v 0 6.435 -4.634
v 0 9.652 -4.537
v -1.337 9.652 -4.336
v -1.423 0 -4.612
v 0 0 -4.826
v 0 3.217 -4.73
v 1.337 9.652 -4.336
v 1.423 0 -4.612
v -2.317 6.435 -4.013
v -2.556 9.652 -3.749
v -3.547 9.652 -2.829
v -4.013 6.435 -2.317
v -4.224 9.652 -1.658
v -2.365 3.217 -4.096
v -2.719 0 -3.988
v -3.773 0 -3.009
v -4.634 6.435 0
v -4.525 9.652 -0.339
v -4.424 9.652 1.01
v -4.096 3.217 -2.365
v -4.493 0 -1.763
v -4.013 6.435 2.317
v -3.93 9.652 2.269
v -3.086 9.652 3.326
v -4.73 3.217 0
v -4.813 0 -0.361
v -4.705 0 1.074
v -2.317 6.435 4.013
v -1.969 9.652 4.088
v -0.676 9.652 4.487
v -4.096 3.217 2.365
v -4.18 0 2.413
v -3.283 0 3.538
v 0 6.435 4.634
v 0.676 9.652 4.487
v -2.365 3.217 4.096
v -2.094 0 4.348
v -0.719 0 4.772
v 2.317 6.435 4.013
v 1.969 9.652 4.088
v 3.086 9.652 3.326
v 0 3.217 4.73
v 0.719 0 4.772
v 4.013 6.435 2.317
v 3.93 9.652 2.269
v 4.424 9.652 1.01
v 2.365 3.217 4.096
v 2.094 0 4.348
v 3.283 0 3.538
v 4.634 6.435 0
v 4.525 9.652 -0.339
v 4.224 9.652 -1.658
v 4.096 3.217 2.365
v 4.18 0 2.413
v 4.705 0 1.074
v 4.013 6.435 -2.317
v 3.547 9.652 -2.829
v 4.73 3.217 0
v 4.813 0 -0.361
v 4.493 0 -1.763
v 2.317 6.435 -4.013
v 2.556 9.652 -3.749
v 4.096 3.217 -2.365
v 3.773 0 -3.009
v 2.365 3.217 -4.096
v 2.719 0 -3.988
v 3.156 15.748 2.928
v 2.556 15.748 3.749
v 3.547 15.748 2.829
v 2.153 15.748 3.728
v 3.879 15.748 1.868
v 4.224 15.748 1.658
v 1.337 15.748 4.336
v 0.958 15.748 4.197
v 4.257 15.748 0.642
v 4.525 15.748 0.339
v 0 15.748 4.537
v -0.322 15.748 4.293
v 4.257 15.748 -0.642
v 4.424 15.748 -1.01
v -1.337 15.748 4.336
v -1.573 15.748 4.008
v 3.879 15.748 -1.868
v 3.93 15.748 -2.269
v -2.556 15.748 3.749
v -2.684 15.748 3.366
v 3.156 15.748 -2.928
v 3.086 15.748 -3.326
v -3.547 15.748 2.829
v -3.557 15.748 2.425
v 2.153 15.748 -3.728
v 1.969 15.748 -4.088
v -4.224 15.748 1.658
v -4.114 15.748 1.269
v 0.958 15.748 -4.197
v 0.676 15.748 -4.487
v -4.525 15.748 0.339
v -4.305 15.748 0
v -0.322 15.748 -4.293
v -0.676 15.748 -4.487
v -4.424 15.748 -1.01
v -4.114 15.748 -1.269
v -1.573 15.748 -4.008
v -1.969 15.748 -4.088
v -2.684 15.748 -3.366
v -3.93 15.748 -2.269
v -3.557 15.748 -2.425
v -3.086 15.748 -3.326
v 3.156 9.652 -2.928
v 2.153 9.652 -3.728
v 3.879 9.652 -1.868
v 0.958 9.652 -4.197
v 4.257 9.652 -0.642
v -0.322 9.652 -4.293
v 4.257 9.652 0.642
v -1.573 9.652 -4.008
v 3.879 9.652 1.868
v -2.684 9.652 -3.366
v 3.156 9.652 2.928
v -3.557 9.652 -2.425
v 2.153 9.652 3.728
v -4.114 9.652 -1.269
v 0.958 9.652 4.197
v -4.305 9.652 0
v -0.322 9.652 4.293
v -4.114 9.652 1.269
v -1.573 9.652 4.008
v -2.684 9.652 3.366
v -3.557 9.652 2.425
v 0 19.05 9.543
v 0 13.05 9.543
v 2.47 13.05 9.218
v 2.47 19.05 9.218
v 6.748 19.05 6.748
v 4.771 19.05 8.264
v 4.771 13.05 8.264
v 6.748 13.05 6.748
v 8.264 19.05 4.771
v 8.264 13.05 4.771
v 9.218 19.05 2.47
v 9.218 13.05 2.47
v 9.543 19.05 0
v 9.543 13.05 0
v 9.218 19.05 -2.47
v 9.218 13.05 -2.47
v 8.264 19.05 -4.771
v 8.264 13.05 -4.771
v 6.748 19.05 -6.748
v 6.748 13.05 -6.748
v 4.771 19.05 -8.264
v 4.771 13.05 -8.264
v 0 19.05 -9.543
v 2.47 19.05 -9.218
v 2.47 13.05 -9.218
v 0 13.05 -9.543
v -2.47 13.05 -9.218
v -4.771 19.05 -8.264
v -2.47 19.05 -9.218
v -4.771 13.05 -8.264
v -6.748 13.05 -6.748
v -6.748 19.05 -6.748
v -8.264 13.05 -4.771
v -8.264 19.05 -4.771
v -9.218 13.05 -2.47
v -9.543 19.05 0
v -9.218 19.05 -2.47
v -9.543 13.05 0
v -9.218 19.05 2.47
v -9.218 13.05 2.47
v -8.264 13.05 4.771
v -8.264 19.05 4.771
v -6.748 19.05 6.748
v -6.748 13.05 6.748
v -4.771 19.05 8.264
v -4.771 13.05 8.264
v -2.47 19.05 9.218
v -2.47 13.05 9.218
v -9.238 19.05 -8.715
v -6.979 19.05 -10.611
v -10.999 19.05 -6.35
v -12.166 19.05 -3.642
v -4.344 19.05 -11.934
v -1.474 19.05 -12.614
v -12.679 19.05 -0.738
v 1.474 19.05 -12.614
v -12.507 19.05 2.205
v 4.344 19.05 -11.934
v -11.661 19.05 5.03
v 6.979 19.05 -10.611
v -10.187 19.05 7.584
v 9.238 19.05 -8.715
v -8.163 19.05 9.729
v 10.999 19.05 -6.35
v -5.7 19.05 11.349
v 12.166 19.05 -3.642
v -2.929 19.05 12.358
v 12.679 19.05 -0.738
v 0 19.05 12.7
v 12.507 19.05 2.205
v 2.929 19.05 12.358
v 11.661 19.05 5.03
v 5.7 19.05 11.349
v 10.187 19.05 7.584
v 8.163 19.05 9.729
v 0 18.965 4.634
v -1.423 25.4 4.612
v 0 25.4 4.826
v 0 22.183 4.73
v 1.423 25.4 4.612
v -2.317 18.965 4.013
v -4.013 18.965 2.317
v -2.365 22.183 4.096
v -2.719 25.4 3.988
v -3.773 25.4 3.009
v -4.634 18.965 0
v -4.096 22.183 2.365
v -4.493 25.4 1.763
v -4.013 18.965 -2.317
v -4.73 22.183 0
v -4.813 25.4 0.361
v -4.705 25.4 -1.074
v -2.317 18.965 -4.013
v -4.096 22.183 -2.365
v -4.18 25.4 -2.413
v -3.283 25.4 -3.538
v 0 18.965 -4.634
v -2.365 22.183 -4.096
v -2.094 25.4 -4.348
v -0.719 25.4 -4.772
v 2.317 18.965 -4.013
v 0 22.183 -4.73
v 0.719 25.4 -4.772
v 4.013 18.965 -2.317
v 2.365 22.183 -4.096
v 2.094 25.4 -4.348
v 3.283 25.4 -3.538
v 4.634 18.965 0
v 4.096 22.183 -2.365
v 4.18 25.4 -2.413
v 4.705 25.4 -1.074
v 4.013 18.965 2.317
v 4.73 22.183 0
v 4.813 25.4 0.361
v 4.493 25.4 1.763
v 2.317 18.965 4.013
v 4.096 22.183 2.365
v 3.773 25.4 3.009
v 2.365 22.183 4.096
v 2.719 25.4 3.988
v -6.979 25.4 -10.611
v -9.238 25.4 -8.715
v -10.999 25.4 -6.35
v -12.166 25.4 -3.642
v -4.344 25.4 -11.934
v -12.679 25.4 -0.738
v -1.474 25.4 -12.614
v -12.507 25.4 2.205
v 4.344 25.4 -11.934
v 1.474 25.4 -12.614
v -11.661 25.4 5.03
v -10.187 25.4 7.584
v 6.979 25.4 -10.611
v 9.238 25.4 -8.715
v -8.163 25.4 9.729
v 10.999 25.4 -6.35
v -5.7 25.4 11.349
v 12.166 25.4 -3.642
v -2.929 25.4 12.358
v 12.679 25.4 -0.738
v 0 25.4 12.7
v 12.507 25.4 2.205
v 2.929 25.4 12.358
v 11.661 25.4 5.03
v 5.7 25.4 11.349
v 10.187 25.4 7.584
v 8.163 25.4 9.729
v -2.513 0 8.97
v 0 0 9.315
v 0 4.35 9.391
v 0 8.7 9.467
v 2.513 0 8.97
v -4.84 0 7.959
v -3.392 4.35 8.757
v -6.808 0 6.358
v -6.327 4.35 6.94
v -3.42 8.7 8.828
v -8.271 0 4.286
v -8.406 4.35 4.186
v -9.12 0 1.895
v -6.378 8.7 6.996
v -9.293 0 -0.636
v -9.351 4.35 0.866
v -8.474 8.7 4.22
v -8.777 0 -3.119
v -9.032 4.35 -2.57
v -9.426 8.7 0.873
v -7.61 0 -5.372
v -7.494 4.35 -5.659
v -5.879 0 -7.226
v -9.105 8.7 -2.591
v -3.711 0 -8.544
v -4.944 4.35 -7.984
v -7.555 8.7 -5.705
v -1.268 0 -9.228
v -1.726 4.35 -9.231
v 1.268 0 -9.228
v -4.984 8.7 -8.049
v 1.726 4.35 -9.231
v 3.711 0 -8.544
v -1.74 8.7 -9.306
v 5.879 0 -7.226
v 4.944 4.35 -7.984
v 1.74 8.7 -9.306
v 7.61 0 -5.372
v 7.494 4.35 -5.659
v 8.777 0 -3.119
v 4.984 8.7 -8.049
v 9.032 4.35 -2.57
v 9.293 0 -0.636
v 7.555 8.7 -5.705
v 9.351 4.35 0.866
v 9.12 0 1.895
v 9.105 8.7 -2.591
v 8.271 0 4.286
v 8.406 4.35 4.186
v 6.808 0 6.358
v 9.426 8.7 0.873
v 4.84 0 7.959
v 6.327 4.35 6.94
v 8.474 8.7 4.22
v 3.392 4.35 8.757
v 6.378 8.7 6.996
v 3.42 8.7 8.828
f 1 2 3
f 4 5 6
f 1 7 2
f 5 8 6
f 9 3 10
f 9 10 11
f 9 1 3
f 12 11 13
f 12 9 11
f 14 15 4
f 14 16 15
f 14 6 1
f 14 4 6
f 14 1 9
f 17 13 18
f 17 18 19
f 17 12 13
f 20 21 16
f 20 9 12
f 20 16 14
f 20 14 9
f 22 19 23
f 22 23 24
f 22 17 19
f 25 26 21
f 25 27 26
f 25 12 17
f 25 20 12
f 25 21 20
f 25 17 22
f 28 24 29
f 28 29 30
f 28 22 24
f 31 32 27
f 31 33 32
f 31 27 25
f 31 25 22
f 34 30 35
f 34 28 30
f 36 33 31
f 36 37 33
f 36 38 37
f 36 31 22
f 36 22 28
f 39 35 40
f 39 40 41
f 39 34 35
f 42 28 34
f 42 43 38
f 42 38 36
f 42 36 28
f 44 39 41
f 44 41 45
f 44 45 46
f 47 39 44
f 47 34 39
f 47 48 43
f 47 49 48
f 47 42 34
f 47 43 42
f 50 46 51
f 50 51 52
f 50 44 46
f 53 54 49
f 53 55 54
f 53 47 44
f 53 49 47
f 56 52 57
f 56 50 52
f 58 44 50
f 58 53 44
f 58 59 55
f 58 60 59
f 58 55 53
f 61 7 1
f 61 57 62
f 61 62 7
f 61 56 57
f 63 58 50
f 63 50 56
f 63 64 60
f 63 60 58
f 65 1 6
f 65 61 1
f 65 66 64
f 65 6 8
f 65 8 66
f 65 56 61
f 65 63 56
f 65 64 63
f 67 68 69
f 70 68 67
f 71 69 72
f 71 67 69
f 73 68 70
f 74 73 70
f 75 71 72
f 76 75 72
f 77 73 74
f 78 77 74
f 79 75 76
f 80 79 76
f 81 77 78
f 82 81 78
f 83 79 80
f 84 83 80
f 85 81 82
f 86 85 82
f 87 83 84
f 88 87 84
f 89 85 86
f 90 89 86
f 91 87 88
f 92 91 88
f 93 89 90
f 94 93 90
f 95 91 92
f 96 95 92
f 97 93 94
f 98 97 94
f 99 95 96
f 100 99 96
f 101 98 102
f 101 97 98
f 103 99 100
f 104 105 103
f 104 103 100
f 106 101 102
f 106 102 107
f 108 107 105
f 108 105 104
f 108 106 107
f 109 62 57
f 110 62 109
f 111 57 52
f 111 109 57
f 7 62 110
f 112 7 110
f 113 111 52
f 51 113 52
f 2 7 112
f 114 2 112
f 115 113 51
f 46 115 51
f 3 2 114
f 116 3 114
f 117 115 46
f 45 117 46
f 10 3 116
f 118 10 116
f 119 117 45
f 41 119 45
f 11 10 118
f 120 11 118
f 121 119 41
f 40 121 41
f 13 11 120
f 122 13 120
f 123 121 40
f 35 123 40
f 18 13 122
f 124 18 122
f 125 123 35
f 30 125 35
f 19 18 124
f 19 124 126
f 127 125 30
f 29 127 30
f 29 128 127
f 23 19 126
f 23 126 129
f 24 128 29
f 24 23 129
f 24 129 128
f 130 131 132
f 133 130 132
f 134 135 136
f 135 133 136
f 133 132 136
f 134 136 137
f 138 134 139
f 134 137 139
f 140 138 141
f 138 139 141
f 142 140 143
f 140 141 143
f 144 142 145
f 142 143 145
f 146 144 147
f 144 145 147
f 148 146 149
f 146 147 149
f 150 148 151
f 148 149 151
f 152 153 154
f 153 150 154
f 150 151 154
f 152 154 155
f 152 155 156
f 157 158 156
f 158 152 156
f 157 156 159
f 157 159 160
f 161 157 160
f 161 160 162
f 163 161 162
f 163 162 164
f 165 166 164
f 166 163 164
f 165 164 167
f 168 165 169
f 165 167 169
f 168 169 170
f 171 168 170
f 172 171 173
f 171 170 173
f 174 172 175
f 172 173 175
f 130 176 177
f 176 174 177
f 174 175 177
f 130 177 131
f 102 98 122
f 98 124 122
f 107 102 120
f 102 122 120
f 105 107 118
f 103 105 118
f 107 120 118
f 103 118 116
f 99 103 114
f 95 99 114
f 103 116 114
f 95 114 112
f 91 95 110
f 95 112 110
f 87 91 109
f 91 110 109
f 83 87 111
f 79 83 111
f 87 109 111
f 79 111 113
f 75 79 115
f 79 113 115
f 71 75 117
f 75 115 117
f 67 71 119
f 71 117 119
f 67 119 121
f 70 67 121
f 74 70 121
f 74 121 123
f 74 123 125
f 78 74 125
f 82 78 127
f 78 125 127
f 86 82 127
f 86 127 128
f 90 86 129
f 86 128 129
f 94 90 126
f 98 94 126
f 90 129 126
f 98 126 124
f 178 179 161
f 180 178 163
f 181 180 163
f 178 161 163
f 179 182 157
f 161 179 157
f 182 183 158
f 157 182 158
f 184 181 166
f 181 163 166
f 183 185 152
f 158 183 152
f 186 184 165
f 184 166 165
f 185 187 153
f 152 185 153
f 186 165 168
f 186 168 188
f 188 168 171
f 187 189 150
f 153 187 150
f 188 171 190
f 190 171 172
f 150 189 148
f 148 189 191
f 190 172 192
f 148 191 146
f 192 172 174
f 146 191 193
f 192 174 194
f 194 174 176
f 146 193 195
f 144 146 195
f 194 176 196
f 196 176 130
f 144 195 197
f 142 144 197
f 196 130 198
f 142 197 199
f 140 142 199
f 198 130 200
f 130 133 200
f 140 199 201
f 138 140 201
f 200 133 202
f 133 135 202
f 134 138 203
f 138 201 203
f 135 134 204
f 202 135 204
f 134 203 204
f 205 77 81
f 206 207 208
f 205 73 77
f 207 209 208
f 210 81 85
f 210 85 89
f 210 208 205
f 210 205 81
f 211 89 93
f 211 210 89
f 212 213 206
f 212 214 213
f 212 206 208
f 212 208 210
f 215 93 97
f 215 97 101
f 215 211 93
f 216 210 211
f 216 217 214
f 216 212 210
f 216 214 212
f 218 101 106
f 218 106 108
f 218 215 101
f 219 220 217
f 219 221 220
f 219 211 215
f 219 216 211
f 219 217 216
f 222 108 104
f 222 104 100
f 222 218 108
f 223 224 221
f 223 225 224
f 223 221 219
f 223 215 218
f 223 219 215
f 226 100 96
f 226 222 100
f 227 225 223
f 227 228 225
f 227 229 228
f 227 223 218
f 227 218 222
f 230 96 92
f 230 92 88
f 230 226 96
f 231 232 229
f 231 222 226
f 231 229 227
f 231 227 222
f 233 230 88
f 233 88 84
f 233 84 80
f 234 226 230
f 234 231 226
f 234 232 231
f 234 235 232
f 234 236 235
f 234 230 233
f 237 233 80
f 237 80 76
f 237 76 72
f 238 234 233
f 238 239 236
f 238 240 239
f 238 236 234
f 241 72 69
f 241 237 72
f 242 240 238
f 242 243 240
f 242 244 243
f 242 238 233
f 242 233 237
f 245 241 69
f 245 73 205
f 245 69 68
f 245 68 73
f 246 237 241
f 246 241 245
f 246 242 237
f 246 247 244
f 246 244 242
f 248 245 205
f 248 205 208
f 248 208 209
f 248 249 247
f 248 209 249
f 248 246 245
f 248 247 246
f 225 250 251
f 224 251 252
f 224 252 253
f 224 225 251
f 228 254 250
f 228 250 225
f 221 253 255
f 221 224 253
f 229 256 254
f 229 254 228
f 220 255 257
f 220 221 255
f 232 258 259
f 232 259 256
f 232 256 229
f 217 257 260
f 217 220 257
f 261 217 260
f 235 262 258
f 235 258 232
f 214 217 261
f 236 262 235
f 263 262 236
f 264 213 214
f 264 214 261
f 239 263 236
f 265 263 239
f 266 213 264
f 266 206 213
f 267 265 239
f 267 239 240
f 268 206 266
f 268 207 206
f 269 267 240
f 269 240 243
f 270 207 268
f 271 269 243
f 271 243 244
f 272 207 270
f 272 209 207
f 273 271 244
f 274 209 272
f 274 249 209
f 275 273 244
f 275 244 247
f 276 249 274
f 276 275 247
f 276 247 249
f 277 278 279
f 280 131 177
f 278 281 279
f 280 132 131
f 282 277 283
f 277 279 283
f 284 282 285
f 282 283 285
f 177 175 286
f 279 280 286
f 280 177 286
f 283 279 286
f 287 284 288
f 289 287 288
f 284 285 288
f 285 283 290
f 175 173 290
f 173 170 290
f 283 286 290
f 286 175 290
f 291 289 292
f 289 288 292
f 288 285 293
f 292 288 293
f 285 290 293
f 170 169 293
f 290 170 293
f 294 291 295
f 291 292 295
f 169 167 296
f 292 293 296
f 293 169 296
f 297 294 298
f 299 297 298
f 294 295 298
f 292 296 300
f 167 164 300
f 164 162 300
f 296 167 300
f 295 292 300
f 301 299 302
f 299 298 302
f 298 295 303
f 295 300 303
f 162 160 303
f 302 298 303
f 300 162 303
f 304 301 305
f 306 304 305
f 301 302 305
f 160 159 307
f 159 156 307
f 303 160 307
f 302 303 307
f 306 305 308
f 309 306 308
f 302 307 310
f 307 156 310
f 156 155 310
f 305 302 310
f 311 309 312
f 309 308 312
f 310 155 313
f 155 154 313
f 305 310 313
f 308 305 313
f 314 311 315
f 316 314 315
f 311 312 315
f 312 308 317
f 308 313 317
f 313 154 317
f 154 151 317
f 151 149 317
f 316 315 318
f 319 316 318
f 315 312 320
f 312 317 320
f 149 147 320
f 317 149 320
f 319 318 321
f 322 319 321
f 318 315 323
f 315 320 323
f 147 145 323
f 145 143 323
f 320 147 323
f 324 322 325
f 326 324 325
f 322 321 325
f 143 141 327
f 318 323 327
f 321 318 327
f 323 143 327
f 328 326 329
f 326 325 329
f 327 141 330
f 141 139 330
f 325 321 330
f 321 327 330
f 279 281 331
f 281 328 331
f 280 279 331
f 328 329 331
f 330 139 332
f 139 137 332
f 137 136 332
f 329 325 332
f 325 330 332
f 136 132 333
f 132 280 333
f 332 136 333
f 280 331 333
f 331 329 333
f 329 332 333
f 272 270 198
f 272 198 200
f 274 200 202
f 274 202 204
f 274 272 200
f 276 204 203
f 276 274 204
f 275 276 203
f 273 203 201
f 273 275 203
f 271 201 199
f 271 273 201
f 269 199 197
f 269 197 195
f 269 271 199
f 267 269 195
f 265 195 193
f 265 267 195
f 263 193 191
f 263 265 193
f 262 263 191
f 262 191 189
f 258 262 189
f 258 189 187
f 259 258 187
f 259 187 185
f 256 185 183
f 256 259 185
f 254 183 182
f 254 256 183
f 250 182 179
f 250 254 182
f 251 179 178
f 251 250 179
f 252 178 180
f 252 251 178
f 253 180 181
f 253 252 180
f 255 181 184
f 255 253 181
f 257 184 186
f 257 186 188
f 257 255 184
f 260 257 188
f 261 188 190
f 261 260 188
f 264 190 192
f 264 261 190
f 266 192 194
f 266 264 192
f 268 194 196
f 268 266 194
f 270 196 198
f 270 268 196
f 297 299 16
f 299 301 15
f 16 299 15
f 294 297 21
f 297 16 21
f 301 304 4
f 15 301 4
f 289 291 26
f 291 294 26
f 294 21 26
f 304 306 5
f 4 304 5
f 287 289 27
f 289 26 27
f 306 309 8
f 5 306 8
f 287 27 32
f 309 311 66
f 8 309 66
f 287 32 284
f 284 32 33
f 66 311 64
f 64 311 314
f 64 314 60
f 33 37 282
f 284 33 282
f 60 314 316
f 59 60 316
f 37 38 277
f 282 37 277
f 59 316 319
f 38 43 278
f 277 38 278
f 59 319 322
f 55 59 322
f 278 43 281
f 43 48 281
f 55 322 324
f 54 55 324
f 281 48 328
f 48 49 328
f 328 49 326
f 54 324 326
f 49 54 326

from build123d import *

# Parameters (mm, degrees)
SKETCH1_R                = 9.54278
BOSS_EXTRUDE1_DEPTH      = 25.4
SKETCH2_R                = 12.7
BOSS_EXTRUDE2_DEPTH      = 6.35
R_0_339_DIAMETER_HOLE1_D = 8.6106


with BuildPart() as part:
    # Sketch1 → Boss-Extrude1 (new body)
    with BuildSketch(Plane(origin=(0, 0, 0), x_dir=(1, 0, 0), z_dir=(0, 1, 0))):
        with Locations(Location((0, 0, 0), (0, 0, 270))):
            Circle(SKETCH1_R)
    extrude(amount=BOSS_EXTRUDE1_DEPTH)

    # Sketch2 → Boss-Extrude2 (add)
    with BuildSketch(Plane(origin=(0, 25.4, 0), x_dir=(1, 0, 0), z_dir=(0, 1, 0))):
        with Locations(Location((0, 0, 0), (0, 0, 270))):
            Circle(SKETCH2_R)
    extrude(amount=-BOSS_EXTRUDE2_DEPTH)

    # R (0.339) Diameter Hole1 (through all)
    with Locations(Plane(origin=(0, 25.4, 0), x_dir=(1, 0, 0), z_dir=(0, 1, 0))):
        with Locations((0, 0)):
            Hole(R_0_339_DIAMETER_HOLE1_D / 2)

    # Sketch4 → 1/8 NPT Tapped Hole1 (revolve, cut)
    with BuildSketch(Plane(origin=(0, 25.4, 0), x_dir=(0, 0, 1), z_dir=(1, 0, 0))):
        Polygon((0, 0), (0, 14.478), (4.2164, 11.944531286), (4.2164, 9.652), (4.537399894, 9.652), (4.8263937, 0), align=None)
    revolve(axis=Axis((0, 31.75, 0), (0, -1, 0)), mode=Mode.SUBTRACT)

    # Sketch6 → 1/8 NPT Tapped Hole2 (revolve, cut)
    with BuildSketch(Plane(origin=(0, 0, 0), x_dir=(0, 0, -1), z_dir=(1, 0, 0))):
        Polygon((0, 0), (0, 14.478), (4.2164, 11.944531286), (4.2164, 9.652), (4.537399894, 9.652), (4.8263937, 0), align=None)
    revolve(axis=Axis((0, -6.35, 0), (0, 1, 0)), mode=Mode.SUBTRACT)

    # Sketch9 → Cut-Revolve1 (revolve, cut)
    with BuildSketch(Plane(origin=(0, 0, 0), x_dir=(0, 0, -1), z_dir=(1, 0, 0))):
        Polygon((-9.314991403, 0), (-9.54278, 13.05), (-9.54278, 0), align=None)
    revolve(axis=Axis((0, 19.05, 0), (0, -1, 0)), mode=Mode.SUBTRACT)


solid = part.part
